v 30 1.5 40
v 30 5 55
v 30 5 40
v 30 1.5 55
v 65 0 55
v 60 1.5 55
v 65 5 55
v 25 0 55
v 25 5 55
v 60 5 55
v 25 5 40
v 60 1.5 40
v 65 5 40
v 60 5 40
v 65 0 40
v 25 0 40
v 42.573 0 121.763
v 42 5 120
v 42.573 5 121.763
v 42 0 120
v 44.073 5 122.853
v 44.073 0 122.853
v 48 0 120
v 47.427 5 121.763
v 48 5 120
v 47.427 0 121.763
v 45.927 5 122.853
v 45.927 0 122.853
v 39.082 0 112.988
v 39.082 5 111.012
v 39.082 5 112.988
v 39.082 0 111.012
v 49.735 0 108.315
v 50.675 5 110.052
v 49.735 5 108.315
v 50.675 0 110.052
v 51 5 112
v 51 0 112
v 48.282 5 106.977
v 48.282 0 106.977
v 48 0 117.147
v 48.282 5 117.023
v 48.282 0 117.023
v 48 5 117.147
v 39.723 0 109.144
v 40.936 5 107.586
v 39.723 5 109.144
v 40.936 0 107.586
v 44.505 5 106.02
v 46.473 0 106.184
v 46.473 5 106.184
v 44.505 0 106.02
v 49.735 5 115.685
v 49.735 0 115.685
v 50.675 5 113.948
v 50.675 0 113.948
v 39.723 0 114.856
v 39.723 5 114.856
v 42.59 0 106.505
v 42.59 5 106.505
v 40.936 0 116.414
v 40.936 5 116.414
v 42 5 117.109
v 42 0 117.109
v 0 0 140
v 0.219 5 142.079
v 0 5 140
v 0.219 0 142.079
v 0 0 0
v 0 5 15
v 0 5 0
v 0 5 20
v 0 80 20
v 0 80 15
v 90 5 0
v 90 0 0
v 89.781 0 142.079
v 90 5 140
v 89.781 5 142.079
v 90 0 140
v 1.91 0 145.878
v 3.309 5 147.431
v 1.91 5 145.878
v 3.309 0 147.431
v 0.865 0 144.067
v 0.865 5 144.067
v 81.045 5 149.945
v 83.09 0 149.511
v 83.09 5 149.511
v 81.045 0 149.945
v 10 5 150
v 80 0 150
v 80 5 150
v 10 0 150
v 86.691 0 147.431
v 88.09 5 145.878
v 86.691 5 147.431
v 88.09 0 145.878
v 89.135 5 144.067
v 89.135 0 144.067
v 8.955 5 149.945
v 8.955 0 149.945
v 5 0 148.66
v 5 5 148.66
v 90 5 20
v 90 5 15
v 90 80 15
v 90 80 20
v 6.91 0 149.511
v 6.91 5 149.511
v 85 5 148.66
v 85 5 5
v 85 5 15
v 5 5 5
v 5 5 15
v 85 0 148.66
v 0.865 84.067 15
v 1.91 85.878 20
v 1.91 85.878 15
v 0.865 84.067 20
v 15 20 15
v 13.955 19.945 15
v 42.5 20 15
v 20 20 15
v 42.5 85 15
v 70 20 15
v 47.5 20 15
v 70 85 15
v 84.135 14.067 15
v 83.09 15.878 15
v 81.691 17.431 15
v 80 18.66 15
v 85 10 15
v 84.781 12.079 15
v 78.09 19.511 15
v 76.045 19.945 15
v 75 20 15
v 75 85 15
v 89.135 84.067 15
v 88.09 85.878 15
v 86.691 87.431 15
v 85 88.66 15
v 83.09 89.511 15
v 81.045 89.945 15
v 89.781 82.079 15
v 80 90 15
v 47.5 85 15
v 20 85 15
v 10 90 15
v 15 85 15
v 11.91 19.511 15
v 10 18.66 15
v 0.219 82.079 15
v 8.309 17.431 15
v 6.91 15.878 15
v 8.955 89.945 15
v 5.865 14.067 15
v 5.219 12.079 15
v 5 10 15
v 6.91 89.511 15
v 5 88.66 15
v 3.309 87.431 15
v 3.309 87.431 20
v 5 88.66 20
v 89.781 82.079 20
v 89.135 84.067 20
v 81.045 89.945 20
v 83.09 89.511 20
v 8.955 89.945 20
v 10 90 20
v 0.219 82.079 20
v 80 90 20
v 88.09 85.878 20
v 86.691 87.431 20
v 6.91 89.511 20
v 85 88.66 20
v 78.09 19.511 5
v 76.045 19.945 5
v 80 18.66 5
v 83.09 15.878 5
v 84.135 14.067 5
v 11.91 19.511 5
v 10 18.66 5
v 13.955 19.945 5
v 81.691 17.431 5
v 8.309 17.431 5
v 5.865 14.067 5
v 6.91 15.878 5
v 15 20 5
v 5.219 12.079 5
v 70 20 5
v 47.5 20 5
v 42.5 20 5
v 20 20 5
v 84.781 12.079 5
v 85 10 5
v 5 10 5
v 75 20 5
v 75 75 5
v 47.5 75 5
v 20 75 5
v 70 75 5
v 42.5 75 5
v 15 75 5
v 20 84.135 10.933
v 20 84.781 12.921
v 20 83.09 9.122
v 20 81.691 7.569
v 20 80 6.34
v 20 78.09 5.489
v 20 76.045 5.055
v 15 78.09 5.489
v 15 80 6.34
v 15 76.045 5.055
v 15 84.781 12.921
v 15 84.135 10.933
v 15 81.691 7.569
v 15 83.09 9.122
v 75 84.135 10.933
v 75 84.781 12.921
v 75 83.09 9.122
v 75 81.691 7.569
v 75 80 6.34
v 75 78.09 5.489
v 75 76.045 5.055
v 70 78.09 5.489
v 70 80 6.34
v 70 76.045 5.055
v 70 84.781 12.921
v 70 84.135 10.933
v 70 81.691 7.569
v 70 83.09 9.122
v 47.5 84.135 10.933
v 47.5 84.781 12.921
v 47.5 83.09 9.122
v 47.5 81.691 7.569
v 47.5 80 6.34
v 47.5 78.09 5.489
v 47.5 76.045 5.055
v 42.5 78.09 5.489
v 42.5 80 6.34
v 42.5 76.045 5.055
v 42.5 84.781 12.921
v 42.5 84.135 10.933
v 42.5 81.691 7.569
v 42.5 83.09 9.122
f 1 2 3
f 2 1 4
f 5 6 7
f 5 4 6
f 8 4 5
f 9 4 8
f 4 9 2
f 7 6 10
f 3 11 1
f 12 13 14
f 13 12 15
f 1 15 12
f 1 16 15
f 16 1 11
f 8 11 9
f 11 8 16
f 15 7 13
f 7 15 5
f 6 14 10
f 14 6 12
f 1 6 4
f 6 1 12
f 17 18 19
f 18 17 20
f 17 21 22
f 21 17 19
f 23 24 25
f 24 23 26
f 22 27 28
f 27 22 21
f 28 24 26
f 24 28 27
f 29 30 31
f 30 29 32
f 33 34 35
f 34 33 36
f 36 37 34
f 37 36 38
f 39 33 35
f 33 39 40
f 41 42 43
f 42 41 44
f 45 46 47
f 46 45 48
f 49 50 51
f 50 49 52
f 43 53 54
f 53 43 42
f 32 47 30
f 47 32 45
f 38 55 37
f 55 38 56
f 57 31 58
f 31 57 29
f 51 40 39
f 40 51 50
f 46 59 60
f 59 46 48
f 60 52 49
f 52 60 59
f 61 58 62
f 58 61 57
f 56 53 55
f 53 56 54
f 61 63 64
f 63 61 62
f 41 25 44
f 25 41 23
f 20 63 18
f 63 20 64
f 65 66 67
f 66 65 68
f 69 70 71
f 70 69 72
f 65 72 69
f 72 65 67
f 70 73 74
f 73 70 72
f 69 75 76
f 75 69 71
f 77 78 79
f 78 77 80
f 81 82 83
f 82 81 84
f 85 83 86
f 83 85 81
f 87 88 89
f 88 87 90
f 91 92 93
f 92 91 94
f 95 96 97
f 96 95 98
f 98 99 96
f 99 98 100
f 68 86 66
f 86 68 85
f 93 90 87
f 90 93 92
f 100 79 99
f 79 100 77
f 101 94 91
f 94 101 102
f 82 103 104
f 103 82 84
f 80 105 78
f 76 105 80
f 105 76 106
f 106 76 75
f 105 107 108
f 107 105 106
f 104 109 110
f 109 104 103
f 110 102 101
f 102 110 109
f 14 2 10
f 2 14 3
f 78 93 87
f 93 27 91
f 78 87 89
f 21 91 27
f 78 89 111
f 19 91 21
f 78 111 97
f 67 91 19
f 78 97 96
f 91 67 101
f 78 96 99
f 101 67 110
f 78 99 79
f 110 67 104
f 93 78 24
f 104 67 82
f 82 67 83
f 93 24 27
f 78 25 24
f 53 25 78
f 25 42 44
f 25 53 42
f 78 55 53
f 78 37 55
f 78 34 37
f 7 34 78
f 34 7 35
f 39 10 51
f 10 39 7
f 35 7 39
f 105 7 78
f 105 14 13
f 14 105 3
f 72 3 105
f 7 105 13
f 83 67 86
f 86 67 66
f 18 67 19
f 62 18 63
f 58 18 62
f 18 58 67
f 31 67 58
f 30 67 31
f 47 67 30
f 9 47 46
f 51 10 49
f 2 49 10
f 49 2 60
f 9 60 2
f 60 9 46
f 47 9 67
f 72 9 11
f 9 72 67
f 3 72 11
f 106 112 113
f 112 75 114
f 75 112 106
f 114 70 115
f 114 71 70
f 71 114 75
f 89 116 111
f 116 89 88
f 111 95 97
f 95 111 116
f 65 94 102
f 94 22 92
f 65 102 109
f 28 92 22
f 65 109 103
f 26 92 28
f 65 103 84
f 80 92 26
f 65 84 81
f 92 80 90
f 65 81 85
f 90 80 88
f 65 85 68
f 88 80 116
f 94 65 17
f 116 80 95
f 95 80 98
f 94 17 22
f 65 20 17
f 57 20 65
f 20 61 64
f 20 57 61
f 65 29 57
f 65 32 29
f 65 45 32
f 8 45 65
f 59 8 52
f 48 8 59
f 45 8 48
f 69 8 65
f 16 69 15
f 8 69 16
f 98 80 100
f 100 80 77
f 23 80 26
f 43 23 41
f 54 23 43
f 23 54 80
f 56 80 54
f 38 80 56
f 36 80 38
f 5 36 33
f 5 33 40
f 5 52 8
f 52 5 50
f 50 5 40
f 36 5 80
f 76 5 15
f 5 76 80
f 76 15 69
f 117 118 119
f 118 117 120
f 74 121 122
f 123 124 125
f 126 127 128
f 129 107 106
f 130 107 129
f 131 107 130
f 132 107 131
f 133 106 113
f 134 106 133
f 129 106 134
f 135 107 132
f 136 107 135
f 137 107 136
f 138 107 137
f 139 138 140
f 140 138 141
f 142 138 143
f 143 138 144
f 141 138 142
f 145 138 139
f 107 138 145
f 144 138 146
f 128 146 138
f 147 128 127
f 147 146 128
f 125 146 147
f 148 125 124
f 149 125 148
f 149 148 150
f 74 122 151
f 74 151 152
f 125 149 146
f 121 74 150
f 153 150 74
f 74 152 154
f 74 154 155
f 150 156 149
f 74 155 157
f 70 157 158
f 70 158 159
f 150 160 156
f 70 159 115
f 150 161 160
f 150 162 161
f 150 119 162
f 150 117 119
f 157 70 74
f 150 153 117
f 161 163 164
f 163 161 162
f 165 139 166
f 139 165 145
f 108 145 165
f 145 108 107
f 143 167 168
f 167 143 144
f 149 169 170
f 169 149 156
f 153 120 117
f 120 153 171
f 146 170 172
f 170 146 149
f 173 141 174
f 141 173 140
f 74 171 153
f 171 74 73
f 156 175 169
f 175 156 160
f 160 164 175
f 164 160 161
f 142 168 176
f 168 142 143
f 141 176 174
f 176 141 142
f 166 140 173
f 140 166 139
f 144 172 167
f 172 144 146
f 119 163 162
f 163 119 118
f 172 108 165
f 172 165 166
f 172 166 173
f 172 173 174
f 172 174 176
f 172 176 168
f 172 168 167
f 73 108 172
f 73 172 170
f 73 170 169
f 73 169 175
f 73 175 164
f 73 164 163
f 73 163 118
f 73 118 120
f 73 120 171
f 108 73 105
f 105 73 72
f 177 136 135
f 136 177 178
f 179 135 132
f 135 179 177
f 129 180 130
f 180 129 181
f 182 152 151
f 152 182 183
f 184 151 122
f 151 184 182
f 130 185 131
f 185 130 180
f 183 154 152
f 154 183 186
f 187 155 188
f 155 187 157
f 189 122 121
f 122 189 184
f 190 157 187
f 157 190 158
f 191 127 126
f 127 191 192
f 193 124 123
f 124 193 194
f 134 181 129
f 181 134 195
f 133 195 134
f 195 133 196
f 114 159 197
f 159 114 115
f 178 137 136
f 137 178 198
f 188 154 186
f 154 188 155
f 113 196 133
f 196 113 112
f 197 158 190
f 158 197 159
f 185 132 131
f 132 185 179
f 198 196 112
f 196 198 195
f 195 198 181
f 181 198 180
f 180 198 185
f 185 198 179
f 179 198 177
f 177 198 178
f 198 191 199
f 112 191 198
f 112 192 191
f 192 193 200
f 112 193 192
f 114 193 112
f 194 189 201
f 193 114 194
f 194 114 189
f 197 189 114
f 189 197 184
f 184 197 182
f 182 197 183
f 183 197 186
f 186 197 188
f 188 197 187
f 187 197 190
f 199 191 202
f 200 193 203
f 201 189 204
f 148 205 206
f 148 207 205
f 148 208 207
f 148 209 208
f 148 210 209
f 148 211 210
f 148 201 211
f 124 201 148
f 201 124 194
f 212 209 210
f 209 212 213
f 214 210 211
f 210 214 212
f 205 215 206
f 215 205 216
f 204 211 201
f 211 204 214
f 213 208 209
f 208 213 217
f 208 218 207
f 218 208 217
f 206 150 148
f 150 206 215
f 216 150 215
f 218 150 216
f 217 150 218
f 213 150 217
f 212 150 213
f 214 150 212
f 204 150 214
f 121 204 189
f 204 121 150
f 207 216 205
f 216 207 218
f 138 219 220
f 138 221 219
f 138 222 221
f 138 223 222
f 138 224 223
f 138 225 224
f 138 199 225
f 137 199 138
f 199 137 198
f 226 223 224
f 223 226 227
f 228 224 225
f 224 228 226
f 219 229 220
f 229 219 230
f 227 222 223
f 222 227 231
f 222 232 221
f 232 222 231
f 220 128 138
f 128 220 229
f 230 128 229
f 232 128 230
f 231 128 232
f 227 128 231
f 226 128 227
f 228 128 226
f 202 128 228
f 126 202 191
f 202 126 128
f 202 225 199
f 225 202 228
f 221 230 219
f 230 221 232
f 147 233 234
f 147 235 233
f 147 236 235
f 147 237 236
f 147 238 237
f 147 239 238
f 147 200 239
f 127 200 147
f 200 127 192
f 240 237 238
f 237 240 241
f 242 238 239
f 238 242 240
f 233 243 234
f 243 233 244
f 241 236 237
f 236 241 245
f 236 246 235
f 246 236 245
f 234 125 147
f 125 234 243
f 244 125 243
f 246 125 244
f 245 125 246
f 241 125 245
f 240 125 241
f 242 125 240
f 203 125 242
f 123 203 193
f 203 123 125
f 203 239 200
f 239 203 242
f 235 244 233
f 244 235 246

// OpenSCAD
/*
 Hand sanitiser holder
 */


width = 90;
depth = width;
height = 150;


//cube([width,5,height]);
//cube([width,depth,5]);


difference() {
    panel(width, 5, height);

    // Strap
    translate([(width / 2) - 20, - 1, 40]) {
        cube([40, 2.5, 15]);
        for (x = [0, 35]) {
            translate([x, 0, 0]) cube([5, 10, 15]);
        }
    }

    // Mount
    translate([(width / 2), - 1, height - 30]) {
        rotate([- 90, 0, 0]) {
            cylinder(r = 3, h = 10, $f1 = 5);
            translate([0, 8, 0]) cylinder(r = 6, h = 10, $f1 = 5);
            translate([- 3, 0, 0]) cube([6, 6, 10]);
        }
    }
    translate([width - 20, 5, height / 2]) rotate([90, 0, 180]) {
        translate([5, 7, 0]) text("Area51");
        translate([0, -7, 0]) text("Sanitiser");
    }

}

translate([0, 0, 20]) rotate([- 90, 0, 0]) panel(width, 5, depth);

translate([5, 0, 15]) rotate([- 90, 0, 0]) panel(width - 10, 10, 20);
translate([15, 0, 5]) strut(5, depth - 10, 15);
translate([width - 20, 0, 5]) strut(5, depth - 10, 15);
translate([(width / 2) - 2.5, 0, 5]) strut(5, depth - 10, 15);

module panel(w, d, h) {
    hull() {
        cube([w, d, h - 10]);
        translate([10, 0, h - 10]) {
            cube([w - 20, d, 10]);
            rotate([- 90, 0, 0]) cylinder(r = 10, h = d, $f1 = 3);
        }
        translate([w - 10, 0, h - 10]) rotate([- 90, 0, 0]) cylinder(r = 10, h = d, $f1 = 3);
    }
}

module strut(w, d, h) {
    hull() {
        cube([w, d - 5, h]);
        translate([0, d - 5, 10]) difference() {
            rotate([90, 0, 90]) cylinder(r = 10, h = 5, $f1 = 3);
            translate([- 3, - 10, 5]) cube([10, 20, 5]);
        }
    }
}
